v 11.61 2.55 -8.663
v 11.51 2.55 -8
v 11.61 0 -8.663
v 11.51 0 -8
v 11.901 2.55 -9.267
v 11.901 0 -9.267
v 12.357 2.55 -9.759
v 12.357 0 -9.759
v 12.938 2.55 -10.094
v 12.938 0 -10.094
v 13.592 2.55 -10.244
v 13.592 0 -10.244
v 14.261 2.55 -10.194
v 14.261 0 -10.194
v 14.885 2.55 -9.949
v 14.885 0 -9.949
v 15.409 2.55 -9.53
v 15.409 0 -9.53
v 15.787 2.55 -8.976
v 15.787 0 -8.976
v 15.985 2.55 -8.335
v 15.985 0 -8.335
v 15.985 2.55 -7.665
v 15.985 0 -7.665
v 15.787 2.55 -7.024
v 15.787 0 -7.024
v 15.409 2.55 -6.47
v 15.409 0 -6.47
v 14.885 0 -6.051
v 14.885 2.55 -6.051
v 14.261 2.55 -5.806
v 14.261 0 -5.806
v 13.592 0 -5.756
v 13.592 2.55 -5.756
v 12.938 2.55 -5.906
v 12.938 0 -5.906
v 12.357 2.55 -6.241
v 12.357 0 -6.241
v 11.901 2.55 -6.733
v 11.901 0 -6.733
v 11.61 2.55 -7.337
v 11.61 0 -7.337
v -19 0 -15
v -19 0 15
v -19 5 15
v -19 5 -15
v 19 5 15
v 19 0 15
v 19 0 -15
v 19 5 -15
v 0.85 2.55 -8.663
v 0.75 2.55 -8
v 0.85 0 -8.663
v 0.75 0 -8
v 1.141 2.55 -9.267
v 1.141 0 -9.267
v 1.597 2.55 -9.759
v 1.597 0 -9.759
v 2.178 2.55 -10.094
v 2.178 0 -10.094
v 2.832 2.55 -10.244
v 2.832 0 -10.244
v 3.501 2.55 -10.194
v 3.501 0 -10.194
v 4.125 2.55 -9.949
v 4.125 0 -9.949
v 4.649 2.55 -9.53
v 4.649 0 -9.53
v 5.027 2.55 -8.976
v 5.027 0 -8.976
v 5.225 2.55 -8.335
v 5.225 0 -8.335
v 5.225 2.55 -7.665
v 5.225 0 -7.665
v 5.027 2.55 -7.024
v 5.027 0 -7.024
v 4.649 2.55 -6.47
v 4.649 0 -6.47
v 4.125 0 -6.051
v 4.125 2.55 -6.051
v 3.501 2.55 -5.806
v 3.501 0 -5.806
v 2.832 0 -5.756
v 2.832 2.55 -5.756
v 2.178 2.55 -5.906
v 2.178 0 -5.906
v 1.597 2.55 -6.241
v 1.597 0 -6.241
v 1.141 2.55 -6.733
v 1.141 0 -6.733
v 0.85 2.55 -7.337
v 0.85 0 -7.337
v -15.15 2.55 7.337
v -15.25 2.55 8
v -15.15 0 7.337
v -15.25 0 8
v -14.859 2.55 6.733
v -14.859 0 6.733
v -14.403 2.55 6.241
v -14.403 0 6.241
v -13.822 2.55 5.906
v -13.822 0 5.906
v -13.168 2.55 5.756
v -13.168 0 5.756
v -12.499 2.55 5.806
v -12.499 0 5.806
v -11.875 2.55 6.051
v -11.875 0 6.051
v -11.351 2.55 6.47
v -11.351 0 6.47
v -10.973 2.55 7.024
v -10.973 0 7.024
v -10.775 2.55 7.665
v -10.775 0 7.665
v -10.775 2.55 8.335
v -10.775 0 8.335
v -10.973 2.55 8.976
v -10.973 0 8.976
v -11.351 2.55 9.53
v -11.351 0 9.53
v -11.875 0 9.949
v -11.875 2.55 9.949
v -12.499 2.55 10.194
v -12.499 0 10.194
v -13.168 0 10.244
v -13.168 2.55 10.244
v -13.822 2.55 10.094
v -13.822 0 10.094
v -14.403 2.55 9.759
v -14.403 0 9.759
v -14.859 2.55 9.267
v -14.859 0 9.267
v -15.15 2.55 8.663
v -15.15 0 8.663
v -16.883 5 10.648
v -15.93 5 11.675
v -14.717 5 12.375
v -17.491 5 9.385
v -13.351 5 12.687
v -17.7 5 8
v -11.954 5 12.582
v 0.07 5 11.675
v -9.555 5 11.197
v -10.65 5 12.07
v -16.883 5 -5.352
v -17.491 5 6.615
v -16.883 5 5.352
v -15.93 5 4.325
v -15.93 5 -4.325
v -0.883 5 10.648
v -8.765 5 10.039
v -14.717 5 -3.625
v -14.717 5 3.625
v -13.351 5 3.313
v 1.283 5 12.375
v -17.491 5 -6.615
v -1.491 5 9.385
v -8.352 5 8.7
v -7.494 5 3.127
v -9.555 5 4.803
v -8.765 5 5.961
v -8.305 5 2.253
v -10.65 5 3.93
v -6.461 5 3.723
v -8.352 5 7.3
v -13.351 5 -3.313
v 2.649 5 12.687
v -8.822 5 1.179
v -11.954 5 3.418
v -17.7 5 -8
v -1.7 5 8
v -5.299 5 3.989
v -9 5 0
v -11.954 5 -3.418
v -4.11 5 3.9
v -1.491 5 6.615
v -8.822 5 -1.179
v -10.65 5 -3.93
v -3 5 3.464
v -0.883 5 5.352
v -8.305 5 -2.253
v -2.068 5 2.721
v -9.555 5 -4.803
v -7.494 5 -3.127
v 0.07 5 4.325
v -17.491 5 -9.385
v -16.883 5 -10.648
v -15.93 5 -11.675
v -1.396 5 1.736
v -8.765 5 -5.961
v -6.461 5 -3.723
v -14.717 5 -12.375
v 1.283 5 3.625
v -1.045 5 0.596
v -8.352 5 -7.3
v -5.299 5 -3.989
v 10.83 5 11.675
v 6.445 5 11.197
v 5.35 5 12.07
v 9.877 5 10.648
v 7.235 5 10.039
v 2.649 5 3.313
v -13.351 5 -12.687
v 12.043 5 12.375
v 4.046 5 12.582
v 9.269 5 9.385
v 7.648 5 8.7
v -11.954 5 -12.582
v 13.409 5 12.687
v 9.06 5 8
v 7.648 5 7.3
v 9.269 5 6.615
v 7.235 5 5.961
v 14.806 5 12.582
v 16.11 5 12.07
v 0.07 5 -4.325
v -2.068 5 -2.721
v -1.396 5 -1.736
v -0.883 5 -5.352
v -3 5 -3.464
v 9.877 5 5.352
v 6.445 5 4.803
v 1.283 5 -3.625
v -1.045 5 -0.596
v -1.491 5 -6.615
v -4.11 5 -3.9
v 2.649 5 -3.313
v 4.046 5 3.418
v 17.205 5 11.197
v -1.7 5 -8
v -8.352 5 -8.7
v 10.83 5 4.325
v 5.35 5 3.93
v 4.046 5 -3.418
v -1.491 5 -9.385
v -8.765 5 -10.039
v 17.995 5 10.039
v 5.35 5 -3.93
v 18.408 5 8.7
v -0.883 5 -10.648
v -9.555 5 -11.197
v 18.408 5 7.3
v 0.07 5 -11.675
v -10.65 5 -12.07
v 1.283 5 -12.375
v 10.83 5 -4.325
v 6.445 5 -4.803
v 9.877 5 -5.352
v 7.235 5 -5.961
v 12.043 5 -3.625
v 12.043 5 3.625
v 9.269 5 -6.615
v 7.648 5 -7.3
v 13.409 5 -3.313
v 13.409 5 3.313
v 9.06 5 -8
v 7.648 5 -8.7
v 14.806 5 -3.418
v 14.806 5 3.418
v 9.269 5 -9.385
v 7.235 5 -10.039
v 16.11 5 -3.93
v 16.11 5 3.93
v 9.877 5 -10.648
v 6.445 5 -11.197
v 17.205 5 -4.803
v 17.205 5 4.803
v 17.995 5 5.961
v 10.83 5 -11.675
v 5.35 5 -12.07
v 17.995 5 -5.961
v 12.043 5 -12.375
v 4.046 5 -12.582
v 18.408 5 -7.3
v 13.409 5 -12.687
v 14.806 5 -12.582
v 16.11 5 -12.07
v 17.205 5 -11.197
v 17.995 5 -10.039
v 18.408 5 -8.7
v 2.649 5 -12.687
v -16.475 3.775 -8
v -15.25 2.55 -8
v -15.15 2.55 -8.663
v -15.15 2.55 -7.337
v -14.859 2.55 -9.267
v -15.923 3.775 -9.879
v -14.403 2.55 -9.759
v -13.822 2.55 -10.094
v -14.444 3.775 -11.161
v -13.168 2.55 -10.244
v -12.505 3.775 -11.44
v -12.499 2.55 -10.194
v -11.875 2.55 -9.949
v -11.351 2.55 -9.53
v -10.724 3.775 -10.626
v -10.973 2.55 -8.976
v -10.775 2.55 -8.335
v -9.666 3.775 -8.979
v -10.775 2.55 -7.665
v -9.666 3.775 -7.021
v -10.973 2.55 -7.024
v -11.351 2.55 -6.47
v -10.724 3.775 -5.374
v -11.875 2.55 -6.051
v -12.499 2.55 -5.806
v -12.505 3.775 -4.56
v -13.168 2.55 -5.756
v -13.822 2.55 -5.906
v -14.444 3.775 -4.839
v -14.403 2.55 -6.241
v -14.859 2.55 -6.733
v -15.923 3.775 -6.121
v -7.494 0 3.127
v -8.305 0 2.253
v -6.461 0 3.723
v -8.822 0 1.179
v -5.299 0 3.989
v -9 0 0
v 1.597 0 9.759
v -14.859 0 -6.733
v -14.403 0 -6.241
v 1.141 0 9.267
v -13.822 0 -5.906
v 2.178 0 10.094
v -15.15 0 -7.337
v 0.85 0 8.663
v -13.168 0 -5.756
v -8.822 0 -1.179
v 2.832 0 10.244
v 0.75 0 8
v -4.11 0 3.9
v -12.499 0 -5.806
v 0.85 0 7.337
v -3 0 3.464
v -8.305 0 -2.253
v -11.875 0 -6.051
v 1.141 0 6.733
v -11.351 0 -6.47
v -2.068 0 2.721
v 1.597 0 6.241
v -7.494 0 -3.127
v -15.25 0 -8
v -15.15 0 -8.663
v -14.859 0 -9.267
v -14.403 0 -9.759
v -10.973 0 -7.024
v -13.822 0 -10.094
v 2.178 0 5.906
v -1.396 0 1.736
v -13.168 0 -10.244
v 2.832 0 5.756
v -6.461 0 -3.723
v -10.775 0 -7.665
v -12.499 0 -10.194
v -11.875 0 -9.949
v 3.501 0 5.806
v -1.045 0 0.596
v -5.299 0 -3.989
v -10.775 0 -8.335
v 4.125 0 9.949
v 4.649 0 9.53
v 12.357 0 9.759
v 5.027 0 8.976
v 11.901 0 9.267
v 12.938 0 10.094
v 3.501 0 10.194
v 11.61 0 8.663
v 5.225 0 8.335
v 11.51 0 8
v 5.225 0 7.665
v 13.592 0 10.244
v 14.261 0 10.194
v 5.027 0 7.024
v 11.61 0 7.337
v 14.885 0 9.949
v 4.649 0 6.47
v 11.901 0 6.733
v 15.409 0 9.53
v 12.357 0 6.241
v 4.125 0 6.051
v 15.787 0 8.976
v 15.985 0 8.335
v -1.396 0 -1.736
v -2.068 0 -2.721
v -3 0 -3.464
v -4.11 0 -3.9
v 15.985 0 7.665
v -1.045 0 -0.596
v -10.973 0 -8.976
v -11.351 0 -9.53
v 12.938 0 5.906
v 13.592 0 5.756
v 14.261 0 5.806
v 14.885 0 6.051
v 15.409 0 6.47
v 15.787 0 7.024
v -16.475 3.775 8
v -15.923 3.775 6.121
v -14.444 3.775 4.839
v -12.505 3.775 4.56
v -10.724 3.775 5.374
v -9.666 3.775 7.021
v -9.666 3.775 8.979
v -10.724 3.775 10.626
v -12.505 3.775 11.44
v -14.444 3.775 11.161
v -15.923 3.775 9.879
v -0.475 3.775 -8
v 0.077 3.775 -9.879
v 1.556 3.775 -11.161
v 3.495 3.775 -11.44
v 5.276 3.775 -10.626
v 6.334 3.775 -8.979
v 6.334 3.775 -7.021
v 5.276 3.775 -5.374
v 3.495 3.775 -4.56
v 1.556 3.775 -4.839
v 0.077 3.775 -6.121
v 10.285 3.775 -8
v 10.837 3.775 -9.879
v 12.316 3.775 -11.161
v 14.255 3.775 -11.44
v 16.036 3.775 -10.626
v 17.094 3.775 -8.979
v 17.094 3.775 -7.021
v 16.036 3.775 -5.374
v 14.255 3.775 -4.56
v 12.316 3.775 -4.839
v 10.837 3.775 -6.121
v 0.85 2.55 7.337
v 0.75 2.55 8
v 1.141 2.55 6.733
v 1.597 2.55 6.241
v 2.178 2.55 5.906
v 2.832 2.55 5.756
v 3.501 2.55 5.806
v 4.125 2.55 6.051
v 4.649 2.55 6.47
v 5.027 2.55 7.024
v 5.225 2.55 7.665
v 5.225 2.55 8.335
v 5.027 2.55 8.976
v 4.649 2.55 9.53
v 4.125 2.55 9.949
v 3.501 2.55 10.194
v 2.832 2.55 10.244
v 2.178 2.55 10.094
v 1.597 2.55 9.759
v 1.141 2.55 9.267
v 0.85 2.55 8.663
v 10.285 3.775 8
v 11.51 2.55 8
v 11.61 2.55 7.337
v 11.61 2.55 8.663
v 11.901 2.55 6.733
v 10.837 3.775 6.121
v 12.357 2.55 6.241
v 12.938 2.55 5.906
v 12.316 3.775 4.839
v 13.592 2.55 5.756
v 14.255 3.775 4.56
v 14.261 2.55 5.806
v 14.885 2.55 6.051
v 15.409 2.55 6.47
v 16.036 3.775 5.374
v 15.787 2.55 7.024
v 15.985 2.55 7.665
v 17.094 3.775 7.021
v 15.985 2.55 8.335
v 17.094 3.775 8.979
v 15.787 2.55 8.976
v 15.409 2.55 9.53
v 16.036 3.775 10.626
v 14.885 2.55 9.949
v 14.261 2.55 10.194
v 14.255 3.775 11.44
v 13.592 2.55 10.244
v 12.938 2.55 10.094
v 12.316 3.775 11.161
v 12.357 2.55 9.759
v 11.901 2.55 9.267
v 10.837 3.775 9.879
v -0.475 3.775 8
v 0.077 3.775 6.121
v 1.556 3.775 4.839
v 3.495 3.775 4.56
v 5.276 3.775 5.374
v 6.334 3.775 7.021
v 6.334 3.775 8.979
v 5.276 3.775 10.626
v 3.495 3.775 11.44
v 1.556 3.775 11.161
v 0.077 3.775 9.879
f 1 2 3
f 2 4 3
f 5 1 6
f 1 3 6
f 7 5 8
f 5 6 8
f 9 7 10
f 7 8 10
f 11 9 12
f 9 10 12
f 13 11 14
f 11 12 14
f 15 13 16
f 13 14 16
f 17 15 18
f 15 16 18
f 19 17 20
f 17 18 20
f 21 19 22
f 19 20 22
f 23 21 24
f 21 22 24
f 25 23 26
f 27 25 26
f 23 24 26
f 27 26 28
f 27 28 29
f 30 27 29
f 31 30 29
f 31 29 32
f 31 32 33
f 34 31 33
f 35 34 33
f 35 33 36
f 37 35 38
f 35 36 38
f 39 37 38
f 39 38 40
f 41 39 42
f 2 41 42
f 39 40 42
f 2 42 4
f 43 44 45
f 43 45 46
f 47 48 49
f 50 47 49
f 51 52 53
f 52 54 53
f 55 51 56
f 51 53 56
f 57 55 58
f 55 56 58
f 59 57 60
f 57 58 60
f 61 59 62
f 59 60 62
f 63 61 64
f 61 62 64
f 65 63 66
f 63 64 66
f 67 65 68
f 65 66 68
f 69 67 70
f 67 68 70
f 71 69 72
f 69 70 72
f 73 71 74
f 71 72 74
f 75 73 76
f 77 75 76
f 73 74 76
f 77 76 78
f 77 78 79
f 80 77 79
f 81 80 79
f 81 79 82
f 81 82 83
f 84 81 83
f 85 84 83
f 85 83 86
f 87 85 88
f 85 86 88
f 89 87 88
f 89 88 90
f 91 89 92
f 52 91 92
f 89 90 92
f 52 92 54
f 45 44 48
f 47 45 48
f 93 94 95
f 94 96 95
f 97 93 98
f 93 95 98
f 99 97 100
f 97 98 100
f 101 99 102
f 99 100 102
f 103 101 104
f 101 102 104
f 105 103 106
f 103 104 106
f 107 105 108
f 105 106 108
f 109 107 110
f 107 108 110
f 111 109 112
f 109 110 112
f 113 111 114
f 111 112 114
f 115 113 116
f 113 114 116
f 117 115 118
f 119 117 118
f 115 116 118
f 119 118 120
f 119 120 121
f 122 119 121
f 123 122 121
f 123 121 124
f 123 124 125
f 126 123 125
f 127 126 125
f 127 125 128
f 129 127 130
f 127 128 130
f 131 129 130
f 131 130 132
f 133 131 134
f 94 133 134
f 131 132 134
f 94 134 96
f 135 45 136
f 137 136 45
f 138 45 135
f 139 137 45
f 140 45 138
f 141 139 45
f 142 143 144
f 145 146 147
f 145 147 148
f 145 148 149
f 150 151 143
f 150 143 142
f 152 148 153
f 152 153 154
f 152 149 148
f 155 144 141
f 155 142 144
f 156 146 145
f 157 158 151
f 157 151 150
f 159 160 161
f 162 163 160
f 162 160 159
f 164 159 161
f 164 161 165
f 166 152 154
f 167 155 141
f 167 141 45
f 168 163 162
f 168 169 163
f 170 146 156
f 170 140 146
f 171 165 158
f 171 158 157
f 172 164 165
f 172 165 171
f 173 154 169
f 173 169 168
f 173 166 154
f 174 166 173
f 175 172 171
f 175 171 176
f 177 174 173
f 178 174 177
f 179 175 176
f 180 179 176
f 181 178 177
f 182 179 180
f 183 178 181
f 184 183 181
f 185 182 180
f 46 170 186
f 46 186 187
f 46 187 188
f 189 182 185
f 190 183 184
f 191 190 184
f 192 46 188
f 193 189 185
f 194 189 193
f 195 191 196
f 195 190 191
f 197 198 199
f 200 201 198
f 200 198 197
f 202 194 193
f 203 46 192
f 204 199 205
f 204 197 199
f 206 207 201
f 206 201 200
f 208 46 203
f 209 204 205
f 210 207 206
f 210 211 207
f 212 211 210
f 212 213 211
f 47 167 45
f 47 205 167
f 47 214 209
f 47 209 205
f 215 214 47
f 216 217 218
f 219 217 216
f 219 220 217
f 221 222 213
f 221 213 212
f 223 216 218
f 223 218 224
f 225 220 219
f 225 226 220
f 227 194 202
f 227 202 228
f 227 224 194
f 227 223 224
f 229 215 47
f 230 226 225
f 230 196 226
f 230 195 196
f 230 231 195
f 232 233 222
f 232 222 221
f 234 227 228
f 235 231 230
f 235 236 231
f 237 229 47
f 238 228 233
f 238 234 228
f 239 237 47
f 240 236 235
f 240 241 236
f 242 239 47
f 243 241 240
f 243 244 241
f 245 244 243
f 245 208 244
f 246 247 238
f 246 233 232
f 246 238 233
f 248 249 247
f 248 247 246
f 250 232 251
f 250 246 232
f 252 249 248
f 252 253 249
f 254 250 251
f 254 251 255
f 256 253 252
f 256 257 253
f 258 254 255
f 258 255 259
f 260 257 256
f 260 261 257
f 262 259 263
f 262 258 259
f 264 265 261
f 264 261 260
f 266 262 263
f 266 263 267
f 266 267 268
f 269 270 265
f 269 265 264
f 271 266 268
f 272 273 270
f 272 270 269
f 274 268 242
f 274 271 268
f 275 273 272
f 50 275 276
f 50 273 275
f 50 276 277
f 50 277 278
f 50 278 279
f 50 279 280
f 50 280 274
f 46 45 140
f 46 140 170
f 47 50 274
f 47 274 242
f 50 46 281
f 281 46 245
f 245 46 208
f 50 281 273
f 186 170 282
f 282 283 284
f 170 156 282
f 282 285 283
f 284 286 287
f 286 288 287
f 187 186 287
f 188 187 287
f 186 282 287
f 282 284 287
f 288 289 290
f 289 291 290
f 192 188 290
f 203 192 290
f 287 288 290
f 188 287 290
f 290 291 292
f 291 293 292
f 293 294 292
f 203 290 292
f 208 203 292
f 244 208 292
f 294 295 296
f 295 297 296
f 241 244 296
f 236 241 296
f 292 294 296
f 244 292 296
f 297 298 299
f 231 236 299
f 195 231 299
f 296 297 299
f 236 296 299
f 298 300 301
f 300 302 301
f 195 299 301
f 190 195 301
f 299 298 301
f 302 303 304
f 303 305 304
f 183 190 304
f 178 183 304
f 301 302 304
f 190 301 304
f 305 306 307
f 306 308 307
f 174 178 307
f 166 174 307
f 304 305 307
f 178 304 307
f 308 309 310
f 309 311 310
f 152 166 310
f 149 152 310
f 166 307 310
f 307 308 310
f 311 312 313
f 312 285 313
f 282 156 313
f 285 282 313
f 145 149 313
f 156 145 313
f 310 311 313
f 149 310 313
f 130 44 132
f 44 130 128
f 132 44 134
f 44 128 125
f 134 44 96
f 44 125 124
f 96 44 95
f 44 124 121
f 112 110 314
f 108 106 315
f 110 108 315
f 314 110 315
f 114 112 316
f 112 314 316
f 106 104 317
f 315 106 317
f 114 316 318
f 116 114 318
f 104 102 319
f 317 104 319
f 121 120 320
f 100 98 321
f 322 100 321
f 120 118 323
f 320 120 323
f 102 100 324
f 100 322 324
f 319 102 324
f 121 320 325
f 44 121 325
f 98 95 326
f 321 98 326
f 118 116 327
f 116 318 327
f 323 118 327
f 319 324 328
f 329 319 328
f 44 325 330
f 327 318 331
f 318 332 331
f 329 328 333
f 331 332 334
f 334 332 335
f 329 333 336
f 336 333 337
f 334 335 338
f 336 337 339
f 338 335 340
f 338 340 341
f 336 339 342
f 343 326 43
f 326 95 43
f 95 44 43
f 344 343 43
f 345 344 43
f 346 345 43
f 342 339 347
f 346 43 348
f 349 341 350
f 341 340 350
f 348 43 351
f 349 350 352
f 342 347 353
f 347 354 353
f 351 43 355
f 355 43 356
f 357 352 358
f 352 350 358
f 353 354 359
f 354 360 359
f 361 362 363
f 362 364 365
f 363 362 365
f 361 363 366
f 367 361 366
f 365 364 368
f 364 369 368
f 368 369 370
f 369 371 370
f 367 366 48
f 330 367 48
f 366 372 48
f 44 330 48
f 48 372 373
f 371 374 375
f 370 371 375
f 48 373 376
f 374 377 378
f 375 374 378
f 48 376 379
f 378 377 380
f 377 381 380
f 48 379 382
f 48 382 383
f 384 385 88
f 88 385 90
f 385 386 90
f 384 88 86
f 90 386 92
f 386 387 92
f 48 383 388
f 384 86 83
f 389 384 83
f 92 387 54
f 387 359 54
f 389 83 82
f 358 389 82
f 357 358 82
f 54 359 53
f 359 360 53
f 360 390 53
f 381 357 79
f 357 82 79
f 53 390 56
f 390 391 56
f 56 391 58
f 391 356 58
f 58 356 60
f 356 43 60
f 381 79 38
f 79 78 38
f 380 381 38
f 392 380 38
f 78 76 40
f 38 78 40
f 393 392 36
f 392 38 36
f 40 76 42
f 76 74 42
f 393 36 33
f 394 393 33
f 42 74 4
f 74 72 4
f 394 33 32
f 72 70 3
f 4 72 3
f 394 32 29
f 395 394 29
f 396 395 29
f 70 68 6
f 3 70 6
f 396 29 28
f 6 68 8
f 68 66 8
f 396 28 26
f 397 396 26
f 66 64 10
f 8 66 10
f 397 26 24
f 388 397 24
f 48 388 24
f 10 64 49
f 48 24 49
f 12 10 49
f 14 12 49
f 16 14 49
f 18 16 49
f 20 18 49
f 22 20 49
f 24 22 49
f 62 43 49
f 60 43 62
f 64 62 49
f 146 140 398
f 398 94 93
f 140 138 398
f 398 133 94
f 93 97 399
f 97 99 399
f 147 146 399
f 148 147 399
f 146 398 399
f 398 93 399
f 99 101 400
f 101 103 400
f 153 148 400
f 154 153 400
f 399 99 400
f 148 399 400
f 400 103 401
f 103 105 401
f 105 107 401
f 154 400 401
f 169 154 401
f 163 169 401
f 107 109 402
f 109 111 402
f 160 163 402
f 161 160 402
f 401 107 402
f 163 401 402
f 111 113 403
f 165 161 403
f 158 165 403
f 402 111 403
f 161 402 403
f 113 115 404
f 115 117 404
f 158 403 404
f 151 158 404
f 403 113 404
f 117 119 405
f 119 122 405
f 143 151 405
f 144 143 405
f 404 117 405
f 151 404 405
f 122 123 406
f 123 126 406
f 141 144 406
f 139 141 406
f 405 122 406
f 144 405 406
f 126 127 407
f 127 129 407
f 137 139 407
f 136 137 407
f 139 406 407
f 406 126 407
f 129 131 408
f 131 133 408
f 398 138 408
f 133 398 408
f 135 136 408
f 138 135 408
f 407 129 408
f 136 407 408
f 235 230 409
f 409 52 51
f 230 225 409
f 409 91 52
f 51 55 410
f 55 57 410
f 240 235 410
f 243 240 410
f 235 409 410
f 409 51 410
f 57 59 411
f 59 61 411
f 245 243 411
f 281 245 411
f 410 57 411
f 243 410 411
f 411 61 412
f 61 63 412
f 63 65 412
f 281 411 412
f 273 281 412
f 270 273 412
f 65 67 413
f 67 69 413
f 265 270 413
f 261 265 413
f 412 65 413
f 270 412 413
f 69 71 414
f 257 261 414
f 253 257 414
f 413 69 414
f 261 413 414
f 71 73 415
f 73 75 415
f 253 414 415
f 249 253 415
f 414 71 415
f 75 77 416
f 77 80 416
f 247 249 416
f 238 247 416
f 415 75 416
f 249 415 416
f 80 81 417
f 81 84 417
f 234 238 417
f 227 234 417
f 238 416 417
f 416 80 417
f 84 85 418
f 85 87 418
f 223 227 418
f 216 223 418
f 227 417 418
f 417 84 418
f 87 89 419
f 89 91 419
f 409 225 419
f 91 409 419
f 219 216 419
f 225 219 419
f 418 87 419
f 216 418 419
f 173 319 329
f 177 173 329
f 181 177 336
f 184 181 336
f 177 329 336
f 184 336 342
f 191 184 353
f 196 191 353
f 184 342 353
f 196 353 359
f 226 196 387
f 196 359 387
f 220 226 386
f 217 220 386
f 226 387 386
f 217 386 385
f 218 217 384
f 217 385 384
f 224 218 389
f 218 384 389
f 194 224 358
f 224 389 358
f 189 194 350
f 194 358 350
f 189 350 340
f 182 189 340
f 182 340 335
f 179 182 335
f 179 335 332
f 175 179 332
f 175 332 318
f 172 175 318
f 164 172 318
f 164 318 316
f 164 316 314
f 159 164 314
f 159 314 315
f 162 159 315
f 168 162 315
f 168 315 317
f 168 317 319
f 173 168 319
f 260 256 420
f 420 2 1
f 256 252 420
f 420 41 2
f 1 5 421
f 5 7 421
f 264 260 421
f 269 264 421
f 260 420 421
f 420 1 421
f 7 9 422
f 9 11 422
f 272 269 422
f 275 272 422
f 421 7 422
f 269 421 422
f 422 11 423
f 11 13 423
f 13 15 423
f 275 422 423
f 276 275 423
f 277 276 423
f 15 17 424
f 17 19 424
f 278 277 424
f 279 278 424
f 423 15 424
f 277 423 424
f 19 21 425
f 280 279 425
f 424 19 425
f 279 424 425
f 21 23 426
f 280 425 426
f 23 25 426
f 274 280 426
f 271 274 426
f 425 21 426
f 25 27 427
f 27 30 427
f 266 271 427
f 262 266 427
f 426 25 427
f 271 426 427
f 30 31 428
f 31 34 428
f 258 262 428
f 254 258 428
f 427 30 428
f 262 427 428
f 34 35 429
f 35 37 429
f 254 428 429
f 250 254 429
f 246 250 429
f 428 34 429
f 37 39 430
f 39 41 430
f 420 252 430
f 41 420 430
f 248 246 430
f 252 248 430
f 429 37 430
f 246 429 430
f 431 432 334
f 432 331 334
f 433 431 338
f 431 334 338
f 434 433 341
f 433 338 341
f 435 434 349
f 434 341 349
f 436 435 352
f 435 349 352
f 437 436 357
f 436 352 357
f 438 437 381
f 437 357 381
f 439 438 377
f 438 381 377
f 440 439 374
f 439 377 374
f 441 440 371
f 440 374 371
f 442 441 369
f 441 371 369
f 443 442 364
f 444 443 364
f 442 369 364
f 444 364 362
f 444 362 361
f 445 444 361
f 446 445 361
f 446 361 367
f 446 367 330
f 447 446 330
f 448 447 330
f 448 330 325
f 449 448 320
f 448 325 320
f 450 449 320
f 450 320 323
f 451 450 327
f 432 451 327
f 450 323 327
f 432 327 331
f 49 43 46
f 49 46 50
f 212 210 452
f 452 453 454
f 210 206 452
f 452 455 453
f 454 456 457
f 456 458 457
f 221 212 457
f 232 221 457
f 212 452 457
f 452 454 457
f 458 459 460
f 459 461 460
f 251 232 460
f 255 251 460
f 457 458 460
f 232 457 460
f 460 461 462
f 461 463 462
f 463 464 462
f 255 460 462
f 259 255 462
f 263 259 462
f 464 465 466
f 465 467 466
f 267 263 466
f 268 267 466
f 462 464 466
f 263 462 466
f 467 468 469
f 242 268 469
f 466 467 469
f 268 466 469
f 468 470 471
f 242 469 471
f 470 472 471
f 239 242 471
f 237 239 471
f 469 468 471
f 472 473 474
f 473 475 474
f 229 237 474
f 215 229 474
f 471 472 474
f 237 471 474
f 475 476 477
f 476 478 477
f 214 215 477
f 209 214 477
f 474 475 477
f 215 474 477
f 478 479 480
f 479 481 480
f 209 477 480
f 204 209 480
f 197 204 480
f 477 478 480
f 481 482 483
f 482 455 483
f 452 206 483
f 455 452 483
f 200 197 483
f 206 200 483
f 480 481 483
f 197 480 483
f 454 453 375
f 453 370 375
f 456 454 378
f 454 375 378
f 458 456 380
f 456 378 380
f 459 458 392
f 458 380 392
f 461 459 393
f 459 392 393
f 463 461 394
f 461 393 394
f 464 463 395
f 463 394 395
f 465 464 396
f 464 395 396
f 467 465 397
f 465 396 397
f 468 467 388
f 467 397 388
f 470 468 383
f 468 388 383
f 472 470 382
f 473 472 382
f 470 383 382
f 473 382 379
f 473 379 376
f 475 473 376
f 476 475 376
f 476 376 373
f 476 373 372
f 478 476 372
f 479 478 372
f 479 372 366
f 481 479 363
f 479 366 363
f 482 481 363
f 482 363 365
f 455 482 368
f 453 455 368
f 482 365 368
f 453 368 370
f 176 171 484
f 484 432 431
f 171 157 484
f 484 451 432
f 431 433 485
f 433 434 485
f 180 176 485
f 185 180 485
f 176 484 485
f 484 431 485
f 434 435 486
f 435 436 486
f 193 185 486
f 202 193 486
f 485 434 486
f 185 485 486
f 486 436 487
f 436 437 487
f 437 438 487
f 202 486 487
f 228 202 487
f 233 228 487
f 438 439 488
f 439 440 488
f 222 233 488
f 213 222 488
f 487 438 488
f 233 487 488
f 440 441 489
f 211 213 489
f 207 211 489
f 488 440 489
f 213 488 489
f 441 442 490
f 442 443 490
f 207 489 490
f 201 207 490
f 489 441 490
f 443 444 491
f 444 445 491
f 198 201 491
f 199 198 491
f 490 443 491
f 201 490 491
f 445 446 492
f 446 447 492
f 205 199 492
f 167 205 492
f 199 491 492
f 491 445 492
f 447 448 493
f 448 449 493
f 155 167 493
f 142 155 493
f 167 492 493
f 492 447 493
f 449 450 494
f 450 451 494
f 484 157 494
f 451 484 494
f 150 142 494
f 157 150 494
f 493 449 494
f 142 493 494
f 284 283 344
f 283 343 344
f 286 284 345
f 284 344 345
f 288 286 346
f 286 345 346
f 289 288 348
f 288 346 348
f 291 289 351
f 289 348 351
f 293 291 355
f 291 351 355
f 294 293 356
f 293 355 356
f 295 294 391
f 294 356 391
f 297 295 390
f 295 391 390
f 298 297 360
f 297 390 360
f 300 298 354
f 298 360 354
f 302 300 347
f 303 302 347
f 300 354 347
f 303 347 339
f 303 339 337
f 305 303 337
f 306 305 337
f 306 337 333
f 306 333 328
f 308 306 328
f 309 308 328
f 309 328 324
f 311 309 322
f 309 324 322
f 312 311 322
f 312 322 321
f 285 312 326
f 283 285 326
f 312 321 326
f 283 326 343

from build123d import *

# Parameters (mm, degrees)
SKIZZE1_W                                            = 38
SKIZZE1_H                                            = 30
AUFSATZ_LINEAR_AUSTRAGEN1_DEPTH                      = 5
FORMSENKUNG_F_R_M4_SENKSCHRAUBE_MIT_SCHL_D           = 4.5
FORMSENKUNG_F_R_M4_SENKSCHRAUBE_MIT_SCHL_CSINK_D     = 9.4
FORMSENKUNG_F_R_M4_SENKSCHRAUBE_MIT_SCHL_CSINK_ANGLE = 90
F_8_0_8_DURCHMESSER_BOHRUNG1_D                       = 8


with BuildPart() as part:
    # Skizze1 → Aufsatz-Linear austragen1 (new body)
    with BuildSketch(Plane(origin=(0, 0, 0), x_dir=(1, 0, 0), z_dir=(0, 1, 0))):
        Rectangle(SKIZZE1_W, SKIZZE1_H)
    extrude(amount=AUFSATZ_LINEAR_AUSTRAGEN1_DEPTH)

    # Formsenkung für M4 Senkschraube mit Schlitz/Kreuzschlitz1 (through all)
    with Locations(Plane(origin=(0, 5, 0), x_dir=(1, 0, 0), z_dir=(0, 1, 0))):
        with Locations((-13, 8), (3, 8), (3, -8), (-13, -8), (13.76, 8), (13.76, -8)):
            CounterSinkHole(FORMSENKUNG_F_R_M4_SENKSCHRAUBE_MIT_SCHL_D / 2, FORMSENKUNG_F_R_M4_SENKSCHRAUBE_MIT_SCHL_CSINK_D / 2, counter_sink_angle=FORMSENKUNG_F_R_M4_SENKSCHRAUBE_MIT_SCHL_CSINK_ANGLE)

    # Ø8.0 (8) Durchmesser Bohrung1 (through all)
    with Locations(Plane(origin=(0, 5, 0), x_dir=(1, 0, 0), z_dir=(0, 1, 0))):
        with Locations((-5, 0)):
            Hole(F_8_0_8_DURCHMESSER_BOHRUNG1_D / 2)


solid = part.part
